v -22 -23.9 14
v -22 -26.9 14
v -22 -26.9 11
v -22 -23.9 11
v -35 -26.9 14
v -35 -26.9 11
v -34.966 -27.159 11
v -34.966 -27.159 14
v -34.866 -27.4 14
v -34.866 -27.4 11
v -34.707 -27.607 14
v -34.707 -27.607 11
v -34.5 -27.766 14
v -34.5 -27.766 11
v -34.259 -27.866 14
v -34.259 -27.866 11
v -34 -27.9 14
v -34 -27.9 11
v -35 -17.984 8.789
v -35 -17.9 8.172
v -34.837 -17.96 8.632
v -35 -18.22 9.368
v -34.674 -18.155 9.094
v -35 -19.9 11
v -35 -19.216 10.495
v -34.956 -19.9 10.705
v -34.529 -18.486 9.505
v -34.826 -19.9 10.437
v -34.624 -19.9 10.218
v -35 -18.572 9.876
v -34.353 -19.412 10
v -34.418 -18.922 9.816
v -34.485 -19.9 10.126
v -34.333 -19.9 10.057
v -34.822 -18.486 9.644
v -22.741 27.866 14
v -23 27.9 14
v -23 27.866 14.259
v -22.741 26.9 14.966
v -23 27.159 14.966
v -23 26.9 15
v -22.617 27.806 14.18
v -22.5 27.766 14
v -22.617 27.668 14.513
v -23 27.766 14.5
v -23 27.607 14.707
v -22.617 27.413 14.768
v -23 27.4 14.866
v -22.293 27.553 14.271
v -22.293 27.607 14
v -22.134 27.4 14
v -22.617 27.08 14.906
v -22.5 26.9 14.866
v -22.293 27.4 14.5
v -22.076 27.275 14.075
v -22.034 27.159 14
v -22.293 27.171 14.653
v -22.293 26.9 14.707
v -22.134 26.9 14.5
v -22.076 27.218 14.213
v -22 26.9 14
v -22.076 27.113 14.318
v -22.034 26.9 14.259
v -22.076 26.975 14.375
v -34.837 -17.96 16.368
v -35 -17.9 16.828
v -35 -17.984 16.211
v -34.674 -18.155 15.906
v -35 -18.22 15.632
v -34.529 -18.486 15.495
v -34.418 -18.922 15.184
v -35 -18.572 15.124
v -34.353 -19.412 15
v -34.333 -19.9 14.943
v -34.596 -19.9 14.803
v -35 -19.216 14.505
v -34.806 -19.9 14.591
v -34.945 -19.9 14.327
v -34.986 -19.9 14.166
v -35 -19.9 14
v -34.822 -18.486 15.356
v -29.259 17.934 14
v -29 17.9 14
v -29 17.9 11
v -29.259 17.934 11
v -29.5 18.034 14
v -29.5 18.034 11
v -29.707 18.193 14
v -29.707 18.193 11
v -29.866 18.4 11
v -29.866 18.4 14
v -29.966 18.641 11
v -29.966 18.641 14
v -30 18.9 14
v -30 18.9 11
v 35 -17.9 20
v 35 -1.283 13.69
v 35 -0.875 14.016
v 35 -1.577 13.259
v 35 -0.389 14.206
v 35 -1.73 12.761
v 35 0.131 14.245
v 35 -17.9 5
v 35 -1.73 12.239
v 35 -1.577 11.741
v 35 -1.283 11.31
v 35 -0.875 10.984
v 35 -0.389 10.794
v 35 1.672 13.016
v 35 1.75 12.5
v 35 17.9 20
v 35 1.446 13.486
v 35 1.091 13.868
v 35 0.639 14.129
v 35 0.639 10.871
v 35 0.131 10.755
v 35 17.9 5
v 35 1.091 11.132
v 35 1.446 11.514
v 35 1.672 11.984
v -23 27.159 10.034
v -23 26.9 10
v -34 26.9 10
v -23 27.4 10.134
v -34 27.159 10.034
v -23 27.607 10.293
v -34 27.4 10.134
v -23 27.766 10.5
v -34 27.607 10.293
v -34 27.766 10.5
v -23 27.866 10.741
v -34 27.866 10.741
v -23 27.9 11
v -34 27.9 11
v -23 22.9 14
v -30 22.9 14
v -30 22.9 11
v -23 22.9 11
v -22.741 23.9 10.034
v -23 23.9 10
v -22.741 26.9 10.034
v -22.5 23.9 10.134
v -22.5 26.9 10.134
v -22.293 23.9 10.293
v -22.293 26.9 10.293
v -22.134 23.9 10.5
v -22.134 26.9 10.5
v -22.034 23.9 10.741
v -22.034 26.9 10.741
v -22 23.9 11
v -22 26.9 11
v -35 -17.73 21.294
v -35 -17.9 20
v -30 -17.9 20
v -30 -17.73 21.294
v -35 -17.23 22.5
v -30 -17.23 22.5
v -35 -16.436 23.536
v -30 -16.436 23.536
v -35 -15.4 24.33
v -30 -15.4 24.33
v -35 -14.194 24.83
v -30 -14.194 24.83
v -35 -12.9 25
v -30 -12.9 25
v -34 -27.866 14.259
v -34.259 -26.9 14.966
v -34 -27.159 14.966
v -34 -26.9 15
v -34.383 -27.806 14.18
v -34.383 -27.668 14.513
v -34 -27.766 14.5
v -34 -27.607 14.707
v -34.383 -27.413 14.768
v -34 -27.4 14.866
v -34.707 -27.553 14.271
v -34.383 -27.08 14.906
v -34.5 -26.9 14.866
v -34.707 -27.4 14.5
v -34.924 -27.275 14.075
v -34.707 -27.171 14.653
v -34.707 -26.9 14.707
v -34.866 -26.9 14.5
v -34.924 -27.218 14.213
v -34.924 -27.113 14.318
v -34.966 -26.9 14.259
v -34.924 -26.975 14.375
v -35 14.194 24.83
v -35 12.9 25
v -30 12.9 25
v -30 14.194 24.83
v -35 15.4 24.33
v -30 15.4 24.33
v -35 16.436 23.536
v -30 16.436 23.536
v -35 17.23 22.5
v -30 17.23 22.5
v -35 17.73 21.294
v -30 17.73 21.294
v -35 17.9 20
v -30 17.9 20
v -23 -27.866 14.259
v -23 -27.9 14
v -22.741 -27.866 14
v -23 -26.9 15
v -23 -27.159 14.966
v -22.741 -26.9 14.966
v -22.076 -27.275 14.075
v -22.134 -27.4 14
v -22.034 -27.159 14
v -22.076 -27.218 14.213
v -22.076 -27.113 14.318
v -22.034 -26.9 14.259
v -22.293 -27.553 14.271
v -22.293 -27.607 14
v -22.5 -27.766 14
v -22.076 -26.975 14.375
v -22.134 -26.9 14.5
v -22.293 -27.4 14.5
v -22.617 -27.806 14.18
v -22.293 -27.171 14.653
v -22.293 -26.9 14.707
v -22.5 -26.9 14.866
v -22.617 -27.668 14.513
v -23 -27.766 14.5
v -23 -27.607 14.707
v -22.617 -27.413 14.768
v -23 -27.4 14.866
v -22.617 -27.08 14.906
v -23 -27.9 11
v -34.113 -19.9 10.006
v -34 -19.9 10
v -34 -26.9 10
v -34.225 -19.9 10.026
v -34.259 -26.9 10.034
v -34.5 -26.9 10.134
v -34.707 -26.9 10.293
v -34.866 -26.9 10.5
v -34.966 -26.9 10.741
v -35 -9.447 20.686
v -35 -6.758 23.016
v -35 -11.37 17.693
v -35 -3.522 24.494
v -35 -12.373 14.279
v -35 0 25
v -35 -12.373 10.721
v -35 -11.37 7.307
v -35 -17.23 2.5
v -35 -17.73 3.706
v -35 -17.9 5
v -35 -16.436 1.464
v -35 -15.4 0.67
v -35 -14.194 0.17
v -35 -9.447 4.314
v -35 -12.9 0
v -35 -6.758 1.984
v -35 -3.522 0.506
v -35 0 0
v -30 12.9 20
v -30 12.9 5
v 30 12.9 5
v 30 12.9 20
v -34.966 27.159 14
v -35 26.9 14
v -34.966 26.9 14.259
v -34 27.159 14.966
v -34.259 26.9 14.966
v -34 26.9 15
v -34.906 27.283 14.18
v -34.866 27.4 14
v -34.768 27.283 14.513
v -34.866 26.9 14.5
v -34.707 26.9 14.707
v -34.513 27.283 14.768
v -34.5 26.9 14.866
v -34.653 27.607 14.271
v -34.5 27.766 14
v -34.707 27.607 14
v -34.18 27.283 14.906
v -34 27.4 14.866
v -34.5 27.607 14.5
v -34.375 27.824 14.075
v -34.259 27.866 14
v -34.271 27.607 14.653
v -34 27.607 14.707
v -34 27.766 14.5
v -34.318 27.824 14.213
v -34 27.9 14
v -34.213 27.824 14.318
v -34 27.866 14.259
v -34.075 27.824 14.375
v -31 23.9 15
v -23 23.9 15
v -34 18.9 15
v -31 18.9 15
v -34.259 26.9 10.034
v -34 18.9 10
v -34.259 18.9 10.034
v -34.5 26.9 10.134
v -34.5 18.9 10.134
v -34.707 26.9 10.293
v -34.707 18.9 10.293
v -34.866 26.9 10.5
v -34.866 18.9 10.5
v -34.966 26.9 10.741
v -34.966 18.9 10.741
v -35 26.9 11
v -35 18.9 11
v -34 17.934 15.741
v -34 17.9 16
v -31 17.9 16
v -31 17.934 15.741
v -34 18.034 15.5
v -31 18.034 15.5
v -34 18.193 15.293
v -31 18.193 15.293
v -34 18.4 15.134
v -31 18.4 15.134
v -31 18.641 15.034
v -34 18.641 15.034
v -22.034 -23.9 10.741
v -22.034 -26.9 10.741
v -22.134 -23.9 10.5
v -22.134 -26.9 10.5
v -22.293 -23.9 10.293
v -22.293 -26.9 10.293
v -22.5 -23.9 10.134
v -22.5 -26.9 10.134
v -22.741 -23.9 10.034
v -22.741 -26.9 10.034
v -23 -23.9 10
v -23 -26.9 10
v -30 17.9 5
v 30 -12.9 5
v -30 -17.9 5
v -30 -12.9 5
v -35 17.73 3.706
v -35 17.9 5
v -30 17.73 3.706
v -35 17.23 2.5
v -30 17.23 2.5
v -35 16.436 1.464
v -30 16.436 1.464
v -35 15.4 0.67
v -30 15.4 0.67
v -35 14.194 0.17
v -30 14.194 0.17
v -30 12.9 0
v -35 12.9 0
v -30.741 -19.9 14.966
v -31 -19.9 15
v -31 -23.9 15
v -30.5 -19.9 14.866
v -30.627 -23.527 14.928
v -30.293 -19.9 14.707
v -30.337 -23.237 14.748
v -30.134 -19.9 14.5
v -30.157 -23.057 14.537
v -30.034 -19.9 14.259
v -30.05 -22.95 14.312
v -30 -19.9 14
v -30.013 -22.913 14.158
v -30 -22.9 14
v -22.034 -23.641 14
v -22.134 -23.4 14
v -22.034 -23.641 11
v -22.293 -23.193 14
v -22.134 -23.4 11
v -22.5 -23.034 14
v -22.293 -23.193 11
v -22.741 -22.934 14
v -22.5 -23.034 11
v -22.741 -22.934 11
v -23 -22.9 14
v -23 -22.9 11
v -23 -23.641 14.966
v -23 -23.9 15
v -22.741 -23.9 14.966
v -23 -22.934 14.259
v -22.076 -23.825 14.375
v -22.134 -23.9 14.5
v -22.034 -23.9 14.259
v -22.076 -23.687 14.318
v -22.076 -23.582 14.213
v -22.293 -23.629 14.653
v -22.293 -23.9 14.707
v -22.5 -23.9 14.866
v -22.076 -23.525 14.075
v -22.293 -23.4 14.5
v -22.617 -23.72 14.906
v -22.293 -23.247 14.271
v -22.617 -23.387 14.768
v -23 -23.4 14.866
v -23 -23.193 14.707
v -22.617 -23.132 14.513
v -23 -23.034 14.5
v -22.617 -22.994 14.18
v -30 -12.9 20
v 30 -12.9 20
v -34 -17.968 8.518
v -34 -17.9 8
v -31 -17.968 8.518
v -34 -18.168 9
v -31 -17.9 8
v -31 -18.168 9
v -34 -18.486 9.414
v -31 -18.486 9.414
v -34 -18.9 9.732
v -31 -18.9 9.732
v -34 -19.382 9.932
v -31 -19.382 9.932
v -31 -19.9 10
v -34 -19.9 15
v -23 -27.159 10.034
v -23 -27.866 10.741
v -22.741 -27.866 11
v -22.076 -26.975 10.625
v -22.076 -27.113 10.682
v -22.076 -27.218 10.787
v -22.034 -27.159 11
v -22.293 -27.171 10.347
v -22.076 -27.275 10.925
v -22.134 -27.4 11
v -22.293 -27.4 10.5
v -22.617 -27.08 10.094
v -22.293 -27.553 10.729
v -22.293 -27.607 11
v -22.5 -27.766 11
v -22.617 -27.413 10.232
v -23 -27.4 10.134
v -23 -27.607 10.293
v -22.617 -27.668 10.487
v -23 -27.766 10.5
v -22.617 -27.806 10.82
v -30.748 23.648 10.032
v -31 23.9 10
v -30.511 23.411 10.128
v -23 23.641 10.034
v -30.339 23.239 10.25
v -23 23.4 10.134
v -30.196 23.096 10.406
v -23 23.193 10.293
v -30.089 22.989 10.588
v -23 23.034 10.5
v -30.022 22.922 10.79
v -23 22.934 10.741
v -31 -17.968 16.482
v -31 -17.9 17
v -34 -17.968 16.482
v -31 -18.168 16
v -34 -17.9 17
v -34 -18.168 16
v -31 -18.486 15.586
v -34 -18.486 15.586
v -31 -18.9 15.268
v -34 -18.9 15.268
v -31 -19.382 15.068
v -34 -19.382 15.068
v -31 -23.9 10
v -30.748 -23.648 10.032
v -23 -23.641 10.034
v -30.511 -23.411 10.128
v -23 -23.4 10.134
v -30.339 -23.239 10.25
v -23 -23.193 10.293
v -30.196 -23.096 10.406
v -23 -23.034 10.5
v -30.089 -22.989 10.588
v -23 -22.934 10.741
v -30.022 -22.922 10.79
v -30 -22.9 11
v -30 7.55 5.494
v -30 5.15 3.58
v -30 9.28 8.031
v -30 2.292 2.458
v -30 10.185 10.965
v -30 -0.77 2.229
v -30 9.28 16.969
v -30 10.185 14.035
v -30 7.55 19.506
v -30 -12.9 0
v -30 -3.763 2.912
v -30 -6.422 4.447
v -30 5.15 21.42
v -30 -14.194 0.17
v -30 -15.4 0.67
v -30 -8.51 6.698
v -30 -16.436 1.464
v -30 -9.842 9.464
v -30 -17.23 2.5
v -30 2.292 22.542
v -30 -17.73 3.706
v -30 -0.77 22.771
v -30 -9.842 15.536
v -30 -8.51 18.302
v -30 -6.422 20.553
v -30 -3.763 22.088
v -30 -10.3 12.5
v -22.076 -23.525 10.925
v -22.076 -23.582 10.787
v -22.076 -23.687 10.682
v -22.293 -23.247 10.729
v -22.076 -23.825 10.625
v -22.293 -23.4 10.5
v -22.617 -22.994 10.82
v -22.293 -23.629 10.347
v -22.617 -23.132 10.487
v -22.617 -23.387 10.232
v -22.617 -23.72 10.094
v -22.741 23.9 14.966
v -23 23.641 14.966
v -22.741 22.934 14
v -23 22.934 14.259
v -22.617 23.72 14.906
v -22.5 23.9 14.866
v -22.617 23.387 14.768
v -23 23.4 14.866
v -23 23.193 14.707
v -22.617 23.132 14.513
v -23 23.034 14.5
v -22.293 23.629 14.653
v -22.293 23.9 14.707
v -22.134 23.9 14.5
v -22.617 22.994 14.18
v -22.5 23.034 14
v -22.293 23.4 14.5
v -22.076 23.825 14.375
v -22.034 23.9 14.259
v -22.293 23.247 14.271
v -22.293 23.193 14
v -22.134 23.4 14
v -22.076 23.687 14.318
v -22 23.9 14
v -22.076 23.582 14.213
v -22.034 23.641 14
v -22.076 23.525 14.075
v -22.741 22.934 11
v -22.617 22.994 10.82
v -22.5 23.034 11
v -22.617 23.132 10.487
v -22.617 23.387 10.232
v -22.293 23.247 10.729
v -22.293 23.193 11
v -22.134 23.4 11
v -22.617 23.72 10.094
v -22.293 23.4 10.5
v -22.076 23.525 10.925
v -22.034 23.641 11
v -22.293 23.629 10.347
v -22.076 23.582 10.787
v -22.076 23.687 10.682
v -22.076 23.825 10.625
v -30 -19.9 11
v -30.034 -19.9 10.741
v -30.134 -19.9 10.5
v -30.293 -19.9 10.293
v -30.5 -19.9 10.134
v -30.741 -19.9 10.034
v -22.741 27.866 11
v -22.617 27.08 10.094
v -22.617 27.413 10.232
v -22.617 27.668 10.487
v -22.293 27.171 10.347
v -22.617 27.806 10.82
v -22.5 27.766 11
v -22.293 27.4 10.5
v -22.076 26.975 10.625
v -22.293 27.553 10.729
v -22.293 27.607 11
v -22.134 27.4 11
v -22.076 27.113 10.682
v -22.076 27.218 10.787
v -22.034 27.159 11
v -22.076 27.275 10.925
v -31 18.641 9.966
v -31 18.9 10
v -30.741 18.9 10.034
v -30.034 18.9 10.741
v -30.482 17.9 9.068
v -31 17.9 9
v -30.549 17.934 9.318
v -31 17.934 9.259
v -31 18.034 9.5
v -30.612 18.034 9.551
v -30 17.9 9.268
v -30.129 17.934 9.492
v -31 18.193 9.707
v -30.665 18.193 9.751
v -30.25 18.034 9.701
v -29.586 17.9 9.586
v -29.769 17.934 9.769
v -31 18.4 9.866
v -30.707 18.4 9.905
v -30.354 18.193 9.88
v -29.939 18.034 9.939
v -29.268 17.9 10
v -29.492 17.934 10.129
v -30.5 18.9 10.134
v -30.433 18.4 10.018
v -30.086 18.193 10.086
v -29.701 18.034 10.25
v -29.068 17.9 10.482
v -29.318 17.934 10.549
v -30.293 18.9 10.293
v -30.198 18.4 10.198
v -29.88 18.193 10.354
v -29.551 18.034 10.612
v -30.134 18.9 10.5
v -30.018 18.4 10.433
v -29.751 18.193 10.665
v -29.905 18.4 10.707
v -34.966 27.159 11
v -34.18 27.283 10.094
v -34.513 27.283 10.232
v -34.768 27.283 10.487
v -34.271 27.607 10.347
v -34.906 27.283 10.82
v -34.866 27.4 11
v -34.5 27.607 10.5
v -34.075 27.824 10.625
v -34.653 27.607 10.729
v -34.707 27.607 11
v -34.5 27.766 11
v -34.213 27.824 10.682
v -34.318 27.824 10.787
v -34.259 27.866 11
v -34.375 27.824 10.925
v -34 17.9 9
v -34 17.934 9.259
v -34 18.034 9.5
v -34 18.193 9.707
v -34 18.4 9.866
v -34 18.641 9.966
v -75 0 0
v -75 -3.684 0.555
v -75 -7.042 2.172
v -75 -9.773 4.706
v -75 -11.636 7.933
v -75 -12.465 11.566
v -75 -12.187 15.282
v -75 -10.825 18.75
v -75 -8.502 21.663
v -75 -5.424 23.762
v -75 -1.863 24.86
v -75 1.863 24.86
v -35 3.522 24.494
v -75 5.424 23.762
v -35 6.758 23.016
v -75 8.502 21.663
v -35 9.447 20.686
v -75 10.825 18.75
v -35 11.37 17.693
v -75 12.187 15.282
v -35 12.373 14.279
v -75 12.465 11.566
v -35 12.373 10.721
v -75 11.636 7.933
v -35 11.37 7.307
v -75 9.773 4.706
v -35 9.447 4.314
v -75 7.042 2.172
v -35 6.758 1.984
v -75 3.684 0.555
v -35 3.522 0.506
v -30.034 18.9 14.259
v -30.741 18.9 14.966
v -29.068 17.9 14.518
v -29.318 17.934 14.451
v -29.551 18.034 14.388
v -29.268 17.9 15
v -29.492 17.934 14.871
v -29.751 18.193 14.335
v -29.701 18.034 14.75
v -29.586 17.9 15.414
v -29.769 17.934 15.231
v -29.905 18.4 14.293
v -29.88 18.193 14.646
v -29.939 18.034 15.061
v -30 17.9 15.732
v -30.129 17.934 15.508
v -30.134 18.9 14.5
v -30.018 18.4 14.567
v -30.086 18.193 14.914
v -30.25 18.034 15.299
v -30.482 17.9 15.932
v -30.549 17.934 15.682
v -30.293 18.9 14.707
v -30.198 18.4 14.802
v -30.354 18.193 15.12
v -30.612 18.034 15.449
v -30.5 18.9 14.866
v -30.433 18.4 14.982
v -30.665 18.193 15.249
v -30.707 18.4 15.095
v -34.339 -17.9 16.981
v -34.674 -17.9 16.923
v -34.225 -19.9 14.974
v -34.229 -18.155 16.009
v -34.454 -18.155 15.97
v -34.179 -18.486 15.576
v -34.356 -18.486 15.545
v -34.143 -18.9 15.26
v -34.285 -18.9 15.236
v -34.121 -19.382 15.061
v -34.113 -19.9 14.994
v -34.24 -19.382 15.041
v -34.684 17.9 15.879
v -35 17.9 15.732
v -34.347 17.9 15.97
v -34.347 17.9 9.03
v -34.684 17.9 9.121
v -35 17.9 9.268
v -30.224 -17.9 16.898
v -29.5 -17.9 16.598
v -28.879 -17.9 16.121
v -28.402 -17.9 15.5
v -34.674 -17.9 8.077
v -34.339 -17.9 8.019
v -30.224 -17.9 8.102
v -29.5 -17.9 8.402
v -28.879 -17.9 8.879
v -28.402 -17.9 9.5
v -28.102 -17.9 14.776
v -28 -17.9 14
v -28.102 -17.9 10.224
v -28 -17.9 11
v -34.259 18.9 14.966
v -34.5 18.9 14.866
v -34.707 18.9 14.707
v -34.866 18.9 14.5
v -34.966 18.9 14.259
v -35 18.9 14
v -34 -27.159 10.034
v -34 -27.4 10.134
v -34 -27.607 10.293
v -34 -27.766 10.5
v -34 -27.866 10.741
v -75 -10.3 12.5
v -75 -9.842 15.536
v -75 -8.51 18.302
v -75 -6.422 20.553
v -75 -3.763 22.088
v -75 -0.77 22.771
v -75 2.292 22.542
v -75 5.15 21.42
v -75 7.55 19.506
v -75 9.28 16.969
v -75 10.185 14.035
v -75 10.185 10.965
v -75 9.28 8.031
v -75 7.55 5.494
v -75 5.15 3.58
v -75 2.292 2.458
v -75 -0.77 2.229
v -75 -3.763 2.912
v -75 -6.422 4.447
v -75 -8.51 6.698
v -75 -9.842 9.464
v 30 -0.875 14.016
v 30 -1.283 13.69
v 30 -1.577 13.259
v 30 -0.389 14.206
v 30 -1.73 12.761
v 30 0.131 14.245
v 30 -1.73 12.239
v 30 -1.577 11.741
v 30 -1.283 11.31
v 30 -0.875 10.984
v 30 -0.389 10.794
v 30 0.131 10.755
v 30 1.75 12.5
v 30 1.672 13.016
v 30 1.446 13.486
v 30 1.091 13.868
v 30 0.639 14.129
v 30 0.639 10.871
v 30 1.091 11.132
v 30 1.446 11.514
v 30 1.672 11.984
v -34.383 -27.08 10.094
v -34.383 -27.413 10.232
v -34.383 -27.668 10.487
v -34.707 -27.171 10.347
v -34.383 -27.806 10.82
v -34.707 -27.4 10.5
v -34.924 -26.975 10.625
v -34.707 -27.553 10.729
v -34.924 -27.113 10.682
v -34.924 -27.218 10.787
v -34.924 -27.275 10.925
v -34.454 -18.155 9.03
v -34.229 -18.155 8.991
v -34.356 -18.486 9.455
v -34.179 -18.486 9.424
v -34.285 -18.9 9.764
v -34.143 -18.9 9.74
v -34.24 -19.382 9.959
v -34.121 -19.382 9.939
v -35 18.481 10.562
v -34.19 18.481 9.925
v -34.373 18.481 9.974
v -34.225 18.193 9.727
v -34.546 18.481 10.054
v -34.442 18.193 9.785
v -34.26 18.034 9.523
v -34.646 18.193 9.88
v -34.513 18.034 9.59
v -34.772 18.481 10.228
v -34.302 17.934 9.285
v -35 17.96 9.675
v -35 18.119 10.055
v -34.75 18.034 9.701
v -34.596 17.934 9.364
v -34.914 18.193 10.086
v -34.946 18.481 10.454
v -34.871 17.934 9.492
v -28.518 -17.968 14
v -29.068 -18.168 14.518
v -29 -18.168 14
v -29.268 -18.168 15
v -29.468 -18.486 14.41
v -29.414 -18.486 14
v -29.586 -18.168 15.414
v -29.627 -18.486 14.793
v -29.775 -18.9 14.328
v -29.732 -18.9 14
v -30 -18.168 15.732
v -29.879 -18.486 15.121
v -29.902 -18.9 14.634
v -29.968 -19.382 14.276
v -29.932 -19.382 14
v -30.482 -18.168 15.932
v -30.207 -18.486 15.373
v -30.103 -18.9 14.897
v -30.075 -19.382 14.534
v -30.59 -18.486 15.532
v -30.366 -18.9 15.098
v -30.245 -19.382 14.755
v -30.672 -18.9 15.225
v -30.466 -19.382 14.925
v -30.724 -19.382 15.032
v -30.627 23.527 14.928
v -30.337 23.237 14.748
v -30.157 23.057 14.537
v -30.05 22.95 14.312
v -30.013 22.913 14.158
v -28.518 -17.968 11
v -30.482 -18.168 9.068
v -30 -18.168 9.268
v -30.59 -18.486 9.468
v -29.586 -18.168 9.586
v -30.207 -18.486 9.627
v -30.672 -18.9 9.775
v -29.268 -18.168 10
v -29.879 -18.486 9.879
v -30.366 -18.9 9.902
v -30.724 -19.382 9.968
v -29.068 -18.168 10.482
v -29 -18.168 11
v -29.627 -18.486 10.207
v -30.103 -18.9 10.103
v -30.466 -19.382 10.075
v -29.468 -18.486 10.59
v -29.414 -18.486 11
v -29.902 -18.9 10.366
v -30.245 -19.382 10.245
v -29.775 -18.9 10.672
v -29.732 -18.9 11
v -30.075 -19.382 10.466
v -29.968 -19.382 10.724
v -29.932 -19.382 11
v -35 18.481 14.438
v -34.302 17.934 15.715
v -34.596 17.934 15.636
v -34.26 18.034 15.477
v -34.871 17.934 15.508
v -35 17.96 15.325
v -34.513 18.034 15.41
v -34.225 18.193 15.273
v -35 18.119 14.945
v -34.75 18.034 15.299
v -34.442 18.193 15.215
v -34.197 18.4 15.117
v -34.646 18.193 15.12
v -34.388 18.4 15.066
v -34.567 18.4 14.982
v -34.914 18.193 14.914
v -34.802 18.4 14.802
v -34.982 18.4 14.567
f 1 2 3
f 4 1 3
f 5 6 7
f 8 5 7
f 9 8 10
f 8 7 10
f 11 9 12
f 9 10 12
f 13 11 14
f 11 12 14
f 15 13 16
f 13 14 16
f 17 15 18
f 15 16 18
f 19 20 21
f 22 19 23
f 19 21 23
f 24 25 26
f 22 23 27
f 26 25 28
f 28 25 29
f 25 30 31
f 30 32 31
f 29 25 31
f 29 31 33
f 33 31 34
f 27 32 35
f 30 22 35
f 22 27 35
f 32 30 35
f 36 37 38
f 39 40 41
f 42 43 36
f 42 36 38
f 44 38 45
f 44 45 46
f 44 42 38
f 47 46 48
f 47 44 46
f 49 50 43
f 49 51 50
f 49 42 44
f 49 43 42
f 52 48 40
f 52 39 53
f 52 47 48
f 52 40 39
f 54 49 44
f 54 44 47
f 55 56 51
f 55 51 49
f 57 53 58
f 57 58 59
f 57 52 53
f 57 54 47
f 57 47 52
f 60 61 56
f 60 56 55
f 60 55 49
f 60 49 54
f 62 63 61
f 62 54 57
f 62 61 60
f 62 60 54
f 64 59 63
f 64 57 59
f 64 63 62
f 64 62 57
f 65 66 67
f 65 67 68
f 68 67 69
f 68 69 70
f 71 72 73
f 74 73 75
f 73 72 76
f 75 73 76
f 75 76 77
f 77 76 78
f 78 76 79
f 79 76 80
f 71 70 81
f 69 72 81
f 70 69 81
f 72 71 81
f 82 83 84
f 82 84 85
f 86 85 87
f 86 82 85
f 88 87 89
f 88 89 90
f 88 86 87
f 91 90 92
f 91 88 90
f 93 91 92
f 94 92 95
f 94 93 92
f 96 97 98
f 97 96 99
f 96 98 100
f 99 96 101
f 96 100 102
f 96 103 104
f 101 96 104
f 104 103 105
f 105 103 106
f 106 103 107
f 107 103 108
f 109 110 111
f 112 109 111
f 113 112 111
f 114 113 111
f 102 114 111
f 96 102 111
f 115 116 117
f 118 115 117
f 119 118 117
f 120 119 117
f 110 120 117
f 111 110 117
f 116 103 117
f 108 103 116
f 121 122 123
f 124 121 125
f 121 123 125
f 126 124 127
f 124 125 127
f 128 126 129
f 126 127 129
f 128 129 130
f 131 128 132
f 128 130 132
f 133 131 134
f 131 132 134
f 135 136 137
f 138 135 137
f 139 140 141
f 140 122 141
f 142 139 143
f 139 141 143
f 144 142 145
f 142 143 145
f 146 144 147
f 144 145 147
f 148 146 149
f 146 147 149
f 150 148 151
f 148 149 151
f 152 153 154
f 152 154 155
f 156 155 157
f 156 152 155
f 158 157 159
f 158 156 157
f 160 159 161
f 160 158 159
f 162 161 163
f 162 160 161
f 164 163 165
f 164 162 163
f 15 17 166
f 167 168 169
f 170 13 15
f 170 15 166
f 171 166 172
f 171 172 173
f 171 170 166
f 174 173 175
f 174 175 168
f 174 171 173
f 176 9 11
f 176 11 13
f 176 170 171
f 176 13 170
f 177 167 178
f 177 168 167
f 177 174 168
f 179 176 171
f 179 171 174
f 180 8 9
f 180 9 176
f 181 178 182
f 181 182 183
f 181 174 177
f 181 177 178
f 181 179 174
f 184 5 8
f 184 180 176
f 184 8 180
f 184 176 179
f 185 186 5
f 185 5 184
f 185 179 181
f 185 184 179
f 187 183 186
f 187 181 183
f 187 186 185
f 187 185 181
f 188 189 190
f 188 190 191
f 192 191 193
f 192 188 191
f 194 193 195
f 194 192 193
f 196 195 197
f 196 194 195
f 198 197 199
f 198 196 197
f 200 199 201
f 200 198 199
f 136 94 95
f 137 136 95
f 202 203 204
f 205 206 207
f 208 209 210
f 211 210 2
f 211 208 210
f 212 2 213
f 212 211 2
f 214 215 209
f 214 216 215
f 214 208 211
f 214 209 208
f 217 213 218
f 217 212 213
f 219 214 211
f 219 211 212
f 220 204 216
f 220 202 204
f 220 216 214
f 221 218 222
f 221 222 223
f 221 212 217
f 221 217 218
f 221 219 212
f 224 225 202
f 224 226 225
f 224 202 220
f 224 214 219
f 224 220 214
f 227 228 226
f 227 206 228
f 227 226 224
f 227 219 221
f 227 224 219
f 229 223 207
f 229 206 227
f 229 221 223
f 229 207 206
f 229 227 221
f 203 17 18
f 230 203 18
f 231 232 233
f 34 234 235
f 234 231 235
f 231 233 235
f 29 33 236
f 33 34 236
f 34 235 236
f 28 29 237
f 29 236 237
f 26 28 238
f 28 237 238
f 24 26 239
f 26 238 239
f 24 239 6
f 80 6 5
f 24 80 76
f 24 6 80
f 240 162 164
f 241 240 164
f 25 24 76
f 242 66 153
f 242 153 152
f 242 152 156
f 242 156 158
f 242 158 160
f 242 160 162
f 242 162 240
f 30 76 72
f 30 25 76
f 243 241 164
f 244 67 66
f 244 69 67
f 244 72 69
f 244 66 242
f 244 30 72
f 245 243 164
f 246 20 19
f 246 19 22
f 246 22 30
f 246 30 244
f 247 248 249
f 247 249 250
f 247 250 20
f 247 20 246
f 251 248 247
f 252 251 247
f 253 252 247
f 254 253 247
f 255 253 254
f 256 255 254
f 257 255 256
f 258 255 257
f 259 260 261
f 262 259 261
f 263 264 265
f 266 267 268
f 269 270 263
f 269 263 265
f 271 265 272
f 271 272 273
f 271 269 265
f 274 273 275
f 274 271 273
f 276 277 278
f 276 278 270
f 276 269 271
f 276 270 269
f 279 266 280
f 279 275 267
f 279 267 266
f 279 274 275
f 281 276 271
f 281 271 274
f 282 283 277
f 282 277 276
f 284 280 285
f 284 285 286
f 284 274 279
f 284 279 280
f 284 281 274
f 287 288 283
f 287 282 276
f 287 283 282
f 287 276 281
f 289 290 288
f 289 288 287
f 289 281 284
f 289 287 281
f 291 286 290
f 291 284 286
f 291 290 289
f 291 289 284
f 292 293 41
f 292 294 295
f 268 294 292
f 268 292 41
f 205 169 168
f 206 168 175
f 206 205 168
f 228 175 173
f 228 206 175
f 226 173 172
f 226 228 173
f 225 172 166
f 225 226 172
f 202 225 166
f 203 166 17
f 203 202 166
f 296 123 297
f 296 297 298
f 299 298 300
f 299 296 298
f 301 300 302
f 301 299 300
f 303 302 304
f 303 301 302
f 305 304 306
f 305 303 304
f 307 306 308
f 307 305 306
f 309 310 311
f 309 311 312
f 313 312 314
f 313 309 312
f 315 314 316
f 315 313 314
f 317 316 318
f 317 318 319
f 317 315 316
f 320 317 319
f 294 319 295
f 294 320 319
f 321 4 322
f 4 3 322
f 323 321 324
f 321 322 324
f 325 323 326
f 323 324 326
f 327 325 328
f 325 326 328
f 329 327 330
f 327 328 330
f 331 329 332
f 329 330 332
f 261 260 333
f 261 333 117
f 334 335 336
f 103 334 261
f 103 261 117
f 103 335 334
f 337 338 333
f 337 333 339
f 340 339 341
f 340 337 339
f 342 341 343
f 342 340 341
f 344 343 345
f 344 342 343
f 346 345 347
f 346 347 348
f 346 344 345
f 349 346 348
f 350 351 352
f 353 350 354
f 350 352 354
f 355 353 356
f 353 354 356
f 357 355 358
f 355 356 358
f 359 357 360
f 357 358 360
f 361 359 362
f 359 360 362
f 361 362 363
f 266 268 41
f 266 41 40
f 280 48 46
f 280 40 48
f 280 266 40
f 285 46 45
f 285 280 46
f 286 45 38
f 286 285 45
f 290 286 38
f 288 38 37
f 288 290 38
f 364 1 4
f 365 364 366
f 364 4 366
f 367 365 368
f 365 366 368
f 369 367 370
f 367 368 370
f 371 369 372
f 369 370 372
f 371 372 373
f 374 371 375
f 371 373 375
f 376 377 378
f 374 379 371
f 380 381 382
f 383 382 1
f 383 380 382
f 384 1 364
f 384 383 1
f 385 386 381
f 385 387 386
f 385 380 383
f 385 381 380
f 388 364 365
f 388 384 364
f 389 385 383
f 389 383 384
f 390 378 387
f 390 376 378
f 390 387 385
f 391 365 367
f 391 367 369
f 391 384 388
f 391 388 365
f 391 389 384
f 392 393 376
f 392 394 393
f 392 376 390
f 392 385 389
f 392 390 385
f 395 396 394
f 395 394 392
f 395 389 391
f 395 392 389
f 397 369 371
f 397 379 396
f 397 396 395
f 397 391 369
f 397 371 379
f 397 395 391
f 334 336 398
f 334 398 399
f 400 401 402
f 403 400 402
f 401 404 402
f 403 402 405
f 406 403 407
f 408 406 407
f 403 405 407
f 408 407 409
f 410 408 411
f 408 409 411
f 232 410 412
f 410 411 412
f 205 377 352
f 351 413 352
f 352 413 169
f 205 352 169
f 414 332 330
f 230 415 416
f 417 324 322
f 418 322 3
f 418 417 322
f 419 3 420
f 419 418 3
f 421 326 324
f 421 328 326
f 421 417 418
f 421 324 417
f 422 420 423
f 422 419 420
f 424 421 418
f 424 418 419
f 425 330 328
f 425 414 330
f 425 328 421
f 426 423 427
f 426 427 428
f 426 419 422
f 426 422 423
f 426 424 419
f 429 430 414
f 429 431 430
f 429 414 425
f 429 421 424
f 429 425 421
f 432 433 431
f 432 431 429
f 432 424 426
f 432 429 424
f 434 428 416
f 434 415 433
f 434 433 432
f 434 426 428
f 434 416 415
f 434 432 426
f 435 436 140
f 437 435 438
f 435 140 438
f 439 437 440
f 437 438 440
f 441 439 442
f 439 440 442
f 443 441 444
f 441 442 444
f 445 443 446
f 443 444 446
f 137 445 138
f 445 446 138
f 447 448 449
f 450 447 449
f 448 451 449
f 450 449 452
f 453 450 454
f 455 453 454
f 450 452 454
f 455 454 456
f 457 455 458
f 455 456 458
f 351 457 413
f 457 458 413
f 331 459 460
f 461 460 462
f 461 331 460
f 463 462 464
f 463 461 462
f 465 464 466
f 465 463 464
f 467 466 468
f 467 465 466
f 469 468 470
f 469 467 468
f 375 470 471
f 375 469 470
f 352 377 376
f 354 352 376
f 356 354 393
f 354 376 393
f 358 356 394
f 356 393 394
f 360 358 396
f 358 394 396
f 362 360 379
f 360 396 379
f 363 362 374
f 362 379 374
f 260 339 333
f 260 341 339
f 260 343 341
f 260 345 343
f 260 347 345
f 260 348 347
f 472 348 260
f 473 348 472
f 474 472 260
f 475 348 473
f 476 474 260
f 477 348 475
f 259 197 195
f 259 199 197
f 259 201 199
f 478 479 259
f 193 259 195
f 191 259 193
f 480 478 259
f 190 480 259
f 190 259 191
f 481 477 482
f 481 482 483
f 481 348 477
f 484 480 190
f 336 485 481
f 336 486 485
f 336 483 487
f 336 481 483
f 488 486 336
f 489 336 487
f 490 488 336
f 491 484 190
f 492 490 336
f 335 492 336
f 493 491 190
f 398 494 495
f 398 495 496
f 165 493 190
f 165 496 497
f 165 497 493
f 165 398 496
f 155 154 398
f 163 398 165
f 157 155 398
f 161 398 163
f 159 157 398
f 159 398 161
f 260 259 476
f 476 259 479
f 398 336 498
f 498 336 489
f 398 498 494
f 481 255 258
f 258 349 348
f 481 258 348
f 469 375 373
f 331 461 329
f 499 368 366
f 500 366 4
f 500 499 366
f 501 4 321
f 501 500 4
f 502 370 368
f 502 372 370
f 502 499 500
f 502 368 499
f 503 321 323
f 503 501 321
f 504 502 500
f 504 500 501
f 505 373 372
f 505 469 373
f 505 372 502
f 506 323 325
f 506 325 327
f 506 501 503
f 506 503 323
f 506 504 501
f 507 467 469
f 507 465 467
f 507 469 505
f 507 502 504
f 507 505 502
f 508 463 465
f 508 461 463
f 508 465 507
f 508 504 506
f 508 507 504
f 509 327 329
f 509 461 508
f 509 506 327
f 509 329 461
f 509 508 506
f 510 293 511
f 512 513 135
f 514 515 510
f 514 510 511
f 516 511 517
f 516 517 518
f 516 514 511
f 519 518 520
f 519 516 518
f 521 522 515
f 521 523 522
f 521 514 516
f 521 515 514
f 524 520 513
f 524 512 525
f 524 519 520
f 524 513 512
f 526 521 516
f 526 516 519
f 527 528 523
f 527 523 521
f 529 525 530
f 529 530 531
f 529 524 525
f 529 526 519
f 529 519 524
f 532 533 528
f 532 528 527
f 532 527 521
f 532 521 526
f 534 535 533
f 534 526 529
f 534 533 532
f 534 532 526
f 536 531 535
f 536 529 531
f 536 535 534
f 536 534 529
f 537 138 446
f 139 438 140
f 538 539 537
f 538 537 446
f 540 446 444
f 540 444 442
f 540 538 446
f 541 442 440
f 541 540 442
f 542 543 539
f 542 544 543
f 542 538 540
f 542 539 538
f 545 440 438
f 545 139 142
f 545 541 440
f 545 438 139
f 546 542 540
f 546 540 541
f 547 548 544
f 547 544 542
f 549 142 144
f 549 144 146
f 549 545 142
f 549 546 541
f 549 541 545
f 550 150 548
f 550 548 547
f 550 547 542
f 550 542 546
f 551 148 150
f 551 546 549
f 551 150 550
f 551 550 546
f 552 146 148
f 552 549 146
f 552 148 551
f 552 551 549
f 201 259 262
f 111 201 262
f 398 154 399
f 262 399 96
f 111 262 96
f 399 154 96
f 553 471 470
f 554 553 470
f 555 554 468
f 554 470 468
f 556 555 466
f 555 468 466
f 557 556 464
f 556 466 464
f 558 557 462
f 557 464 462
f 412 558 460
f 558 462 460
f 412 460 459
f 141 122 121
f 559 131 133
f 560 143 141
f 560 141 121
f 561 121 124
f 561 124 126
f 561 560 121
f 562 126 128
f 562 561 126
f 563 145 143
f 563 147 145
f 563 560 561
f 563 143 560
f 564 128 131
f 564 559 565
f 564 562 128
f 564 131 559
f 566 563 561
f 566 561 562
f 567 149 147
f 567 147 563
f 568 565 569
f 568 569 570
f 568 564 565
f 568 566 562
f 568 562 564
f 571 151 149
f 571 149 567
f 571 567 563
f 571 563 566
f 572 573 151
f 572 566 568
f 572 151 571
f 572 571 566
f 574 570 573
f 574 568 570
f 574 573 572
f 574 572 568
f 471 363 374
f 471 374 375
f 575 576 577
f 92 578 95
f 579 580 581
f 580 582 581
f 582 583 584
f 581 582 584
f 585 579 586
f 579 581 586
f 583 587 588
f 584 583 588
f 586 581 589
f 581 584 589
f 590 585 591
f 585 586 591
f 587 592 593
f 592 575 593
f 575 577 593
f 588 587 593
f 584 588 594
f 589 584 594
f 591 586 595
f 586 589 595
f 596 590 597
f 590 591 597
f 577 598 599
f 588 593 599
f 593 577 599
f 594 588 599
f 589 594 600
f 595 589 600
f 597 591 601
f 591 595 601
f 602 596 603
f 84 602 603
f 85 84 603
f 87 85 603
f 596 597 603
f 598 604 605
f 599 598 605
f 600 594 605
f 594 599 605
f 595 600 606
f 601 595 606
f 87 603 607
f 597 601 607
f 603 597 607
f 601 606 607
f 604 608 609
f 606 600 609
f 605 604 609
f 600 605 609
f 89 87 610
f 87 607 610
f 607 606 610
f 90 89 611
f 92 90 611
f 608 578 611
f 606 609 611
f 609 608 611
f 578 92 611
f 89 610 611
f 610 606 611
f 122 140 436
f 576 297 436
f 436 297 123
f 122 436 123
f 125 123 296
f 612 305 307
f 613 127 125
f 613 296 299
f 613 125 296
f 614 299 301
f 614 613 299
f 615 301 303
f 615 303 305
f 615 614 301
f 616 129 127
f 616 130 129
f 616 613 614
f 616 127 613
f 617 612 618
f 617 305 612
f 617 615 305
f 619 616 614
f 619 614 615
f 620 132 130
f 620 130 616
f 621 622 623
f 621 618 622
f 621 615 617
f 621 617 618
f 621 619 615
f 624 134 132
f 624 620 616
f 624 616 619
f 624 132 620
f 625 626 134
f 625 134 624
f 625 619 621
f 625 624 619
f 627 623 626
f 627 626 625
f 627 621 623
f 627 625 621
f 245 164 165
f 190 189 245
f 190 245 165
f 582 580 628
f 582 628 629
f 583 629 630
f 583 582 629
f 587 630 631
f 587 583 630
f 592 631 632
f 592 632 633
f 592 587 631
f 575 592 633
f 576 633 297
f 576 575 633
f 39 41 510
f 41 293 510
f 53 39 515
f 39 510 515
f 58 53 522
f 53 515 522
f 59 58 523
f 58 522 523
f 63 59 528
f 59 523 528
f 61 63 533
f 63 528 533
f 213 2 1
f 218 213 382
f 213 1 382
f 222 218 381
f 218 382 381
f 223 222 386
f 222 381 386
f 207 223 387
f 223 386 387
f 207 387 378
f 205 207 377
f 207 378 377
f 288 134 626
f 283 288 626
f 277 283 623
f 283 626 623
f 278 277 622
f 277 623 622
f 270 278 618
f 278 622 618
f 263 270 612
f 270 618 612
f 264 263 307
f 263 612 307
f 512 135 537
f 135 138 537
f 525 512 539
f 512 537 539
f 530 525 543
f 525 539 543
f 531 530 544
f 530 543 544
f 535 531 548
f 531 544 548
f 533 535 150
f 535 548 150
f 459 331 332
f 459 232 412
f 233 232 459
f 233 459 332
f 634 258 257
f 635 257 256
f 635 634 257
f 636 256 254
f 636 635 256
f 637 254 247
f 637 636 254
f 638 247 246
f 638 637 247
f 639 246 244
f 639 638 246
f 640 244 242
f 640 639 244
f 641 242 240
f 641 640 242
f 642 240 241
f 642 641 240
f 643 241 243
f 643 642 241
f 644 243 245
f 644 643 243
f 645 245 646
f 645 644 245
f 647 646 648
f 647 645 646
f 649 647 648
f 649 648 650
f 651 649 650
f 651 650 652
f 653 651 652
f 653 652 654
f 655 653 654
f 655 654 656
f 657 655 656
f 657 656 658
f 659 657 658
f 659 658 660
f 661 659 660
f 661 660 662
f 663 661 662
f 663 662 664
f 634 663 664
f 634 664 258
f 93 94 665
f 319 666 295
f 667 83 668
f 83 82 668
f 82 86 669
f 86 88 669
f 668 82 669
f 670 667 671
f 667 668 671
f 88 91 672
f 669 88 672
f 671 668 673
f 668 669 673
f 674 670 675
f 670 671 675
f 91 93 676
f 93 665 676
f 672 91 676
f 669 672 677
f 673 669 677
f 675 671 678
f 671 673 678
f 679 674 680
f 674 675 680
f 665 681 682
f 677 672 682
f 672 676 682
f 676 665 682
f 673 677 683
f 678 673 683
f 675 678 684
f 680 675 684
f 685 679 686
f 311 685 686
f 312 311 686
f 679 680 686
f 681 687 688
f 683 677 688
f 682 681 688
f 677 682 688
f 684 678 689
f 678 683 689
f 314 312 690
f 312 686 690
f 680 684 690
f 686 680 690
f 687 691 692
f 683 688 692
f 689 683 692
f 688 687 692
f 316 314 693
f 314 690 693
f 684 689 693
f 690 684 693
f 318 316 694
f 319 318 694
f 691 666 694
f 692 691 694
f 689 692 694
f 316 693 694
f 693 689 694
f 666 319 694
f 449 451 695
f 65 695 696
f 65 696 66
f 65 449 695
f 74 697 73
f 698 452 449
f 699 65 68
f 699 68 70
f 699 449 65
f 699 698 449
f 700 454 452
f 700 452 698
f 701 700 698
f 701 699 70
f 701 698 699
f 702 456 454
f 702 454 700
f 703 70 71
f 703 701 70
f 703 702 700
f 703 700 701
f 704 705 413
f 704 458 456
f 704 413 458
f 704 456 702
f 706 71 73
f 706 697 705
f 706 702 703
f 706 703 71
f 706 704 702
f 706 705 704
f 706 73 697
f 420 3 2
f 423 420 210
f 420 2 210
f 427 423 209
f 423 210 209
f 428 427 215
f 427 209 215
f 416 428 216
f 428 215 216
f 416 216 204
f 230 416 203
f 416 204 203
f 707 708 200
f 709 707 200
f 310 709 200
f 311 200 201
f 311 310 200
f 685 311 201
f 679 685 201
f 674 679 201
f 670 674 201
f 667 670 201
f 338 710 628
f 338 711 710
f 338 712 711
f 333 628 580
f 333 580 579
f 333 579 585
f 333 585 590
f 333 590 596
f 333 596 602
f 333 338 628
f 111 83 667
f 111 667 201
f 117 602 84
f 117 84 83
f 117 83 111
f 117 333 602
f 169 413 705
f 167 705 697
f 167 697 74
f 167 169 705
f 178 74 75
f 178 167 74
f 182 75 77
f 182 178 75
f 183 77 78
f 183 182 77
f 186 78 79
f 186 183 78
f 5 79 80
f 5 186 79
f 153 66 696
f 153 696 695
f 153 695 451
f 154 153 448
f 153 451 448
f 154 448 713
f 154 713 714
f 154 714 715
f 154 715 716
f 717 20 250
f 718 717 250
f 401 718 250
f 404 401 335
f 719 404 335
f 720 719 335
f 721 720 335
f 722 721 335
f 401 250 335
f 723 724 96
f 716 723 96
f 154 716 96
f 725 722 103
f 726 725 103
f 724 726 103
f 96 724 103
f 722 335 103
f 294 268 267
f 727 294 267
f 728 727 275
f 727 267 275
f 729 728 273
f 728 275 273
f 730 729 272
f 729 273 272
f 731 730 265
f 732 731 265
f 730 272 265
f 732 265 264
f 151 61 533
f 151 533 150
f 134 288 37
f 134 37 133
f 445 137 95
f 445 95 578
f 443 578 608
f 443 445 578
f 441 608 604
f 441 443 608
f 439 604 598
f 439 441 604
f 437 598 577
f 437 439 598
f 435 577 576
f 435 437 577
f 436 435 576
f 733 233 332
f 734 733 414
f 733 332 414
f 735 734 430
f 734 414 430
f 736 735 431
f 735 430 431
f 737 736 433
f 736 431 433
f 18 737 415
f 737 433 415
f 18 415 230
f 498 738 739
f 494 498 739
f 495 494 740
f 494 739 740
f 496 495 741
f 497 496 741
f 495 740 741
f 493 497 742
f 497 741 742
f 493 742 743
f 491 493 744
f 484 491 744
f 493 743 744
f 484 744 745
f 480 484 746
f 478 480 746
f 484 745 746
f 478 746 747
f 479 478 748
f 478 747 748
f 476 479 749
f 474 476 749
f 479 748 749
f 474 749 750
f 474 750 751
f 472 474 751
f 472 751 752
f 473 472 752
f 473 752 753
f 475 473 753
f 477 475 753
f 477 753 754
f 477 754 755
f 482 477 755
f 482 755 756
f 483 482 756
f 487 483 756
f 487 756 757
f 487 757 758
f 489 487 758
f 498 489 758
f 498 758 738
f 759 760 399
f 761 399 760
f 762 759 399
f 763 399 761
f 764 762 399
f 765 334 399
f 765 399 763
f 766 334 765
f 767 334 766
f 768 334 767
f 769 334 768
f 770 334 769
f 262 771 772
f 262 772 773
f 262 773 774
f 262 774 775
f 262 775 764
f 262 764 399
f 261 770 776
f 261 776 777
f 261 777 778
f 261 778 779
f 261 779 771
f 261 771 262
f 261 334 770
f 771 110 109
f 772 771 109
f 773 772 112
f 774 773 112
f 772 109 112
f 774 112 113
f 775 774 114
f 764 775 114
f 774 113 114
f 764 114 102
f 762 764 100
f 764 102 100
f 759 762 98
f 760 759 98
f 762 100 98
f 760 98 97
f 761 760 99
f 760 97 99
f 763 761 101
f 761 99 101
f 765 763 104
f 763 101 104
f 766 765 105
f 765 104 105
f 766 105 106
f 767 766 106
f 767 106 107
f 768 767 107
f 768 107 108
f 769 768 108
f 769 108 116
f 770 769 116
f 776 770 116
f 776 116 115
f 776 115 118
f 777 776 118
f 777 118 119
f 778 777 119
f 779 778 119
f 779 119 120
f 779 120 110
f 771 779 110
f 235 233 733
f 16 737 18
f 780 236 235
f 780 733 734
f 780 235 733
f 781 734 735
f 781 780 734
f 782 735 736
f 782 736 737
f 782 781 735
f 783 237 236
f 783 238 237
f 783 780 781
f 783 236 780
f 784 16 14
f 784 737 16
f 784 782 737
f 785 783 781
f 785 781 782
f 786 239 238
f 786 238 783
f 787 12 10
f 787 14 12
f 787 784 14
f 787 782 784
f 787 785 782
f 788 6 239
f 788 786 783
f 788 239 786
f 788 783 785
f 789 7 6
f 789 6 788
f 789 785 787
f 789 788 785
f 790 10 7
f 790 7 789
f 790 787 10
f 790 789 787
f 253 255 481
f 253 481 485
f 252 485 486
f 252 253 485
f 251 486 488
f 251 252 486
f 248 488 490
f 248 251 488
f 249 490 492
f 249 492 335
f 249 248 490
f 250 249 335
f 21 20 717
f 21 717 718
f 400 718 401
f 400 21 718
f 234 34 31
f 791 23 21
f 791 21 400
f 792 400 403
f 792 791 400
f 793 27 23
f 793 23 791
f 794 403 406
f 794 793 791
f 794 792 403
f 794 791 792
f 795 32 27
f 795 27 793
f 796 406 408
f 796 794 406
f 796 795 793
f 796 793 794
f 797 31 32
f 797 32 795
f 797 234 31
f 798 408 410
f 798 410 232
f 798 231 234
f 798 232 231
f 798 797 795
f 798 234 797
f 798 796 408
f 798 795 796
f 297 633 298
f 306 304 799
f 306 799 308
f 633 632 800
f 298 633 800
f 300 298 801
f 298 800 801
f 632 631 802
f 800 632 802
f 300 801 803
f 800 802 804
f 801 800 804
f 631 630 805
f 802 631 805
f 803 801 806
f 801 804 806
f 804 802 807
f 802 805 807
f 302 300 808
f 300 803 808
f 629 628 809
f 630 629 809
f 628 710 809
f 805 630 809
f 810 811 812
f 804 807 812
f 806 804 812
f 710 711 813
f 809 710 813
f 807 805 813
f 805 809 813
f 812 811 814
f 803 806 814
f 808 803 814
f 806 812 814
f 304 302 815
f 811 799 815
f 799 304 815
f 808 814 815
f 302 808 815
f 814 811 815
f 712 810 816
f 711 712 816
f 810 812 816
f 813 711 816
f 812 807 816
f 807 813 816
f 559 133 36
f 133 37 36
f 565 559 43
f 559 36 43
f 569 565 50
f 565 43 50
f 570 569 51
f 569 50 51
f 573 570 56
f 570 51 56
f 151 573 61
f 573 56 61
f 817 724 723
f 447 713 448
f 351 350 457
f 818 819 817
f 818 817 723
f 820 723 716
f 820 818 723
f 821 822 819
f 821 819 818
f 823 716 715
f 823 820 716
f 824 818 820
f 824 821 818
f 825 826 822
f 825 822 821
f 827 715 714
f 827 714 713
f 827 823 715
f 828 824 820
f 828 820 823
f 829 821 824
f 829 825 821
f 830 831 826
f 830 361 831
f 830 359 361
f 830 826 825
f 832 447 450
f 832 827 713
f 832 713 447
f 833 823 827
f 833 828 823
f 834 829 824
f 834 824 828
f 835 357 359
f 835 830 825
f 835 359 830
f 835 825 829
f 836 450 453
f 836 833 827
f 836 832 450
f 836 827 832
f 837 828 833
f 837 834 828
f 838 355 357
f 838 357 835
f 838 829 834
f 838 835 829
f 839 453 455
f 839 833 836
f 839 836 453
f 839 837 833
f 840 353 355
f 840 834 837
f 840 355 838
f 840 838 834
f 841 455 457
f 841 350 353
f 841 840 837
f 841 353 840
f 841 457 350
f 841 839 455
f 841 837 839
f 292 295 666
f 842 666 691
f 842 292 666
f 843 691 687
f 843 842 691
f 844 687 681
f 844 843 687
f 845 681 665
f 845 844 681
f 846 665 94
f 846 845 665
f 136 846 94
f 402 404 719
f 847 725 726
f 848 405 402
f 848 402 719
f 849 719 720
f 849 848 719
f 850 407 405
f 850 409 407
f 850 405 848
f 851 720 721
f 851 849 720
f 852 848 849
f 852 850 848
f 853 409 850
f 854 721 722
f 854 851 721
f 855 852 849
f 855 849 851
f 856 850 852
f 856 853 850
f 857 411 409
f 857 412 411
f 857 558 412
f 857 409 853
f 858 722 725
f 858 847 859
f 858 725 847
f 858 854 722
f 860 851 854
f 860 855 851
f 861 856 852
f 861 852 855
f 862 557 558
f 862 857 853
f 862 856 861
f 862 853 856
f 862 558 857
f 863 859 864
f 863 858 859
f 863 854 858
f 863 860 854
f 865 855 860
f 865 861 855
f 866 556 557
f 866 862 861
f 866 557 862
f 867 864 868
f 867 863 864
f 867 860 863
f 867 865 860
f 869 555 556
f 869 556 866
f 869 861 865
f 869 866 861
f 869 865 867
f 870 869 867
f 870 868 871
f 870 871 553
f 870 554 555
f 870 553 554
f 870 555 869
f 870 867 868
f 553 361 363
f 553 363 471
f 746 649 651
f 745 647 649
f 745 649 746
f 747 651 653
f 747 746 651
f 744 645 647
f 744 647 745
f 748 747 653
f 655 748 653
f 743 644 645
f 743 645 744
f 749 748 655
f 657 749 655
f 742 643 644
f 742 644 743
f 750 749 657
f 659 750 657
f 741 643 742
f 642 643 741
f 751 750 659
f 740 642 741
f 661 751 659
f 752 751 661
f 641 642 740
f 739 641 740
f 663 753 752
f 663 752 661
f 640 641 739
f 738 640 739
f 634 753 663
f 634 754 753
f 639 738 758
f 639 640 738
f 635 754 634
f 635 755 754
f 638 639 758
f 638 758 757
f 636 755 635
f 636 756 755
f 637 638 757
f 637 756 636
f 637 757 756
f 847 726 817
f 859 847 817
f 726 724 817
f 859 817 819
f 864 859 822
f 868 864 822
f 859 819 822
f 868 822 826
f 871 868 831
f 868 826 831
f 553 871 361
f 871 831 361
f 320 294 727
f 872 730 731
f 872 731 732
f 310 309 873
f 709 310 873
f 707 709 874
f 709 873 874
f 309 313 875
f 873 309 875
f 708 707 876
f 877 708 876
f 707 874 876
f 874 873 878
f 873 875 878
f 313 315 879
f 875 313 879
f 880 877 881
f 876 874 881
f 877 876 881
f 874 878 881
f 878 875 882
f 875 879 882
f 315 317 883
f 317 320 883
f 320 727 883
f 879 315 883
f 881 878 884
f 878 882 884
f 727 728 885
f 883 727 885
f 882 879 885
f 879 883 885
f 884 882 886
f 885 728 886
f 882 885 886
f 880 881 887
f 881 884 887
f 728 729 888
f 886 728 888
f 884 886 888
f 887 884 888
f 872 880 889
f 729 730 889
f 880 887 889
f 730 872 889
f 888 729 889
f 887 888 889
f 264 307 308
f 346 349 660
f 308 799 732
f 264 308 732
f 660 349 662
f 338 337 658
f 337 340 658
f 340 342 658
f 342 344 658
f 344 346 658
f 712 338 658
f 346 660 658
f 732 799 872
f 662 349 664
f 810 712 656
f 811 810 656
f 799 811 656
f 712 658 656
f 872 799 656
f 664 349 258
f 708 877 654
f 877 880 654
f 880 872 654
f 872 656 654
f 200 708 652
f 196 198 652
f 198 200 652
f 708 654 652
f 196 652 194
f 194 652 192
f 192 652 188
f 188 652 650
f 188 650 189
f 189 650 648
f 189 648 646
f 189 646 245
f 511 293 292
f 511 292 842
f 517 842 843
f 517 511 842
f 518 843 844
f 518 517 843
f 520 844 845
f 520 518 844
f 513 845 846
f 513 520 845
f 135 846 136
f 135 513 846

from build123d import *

# Parameters (mm, degrees)
SKETCH1_W            = 70
SKETCH1_H            = 35.8
SKETCH1_W_2          = 60
SKETCH1_H_2          = 25.8
BOSS_EXTRUDE1_DEPTH  = 25
CUT_EXTRUDE4_REACH   = 78.455
SKETCH2_R            = 10.3
CUT_EXTRUDE5_REACH   = 78.455
SKETCH3_R            = 1.75
BOSS_EXTRUDE2_START  = 40
SKETCH4_R            = 12.5
SKETCH4_R_2          = 10.3
BOSS_EXTRUDE2_DEPTH  = 40
SKETCH8_W            = 5
SKETCH8_H            = 5
BOSS_EXTRUDE4_DEPTH  = 10
SKETCH11_W           = 5
SKETCH11_H           = 5
BOSS_EXTRUDE5_DEPTH  = 8
FILLET3_R            = 1
FILLET3_OF_MIRROR2_R = 1
FILLET5_START        = -35
FILLET5_DEPTH        = 71
FILLET6_R            = 1
FILLET7_R            = 1
FILLET8_R            = 1
FILLET9_R            = 1
FILLET10_R           = 2
SKETCH16_W           = 65
SKETCH16_H           = 5
CUT_EXTRUDE8_DEPTH   = 92.365420182


with BuildPart() as part:
    # Sketch1 → Boss-Extrude1 (new body)
    with BuildSketch(Plane.XY):
        Rectangle(SKETCH1_W, SKETCH1_H)
        Rectangle(SKETCH1_W_2, SKETCH1_H_2, mode=Mode.SUBTRACT)
    extrude(amount=BOSS_EXTRUDE1_DEPTH)

    # Sketch2 → Cut-Extrude4 (cut, up to next)
    with BuildSketch(Plane.ZY.offset(35), mode=Mode.PRIVATE) as cut_extrude4_sk1:
        with Locations(Location((12.5, 0, 0), (0, 0, 270))):
            Circle(SKETCH2_R)
    cut_extrude4_tool1 = extrude(cut_extrude4_sk1.sketch, amount=-CUT_EXTRUDE4_REACH, mode=Mode.PRIVATE) & part.part
    add(cut_extrude4_tool1.solids().sort_by_distance((-35, 0, 12.5))[0], mode=Mode.SUBTRACT)

    # Sketch3 → Cut-Extrude5 (cut, up to next)
    with BuildSketch(Plane(origin=(35, 0, 0), x_dir=(0, 0, -1), z_dir=(1, 0, 0)), mode=Mode.PRIVATE) as cut_extrude5_sk1:
        with Locations(Location((-12.5, 0, 0), (0, 0, 90))):
            Circle(SKETCH3_R)
    cut_extrude5_tool1 = extrude(cut_extrude5_sk1.sketch, amount=-CUT_EXTRUDE5_REACH, mode=Mode.PRIVATE) & part.part
    add(cut_extrude5_tool1.solids().sort_by_distance((35, 0, 12.5))[0], mode=Mode.SUBTRACT)

    # Sketch4 → Boss-Extrude2 (add)
    with BuildSketch(Plane.ZY.offset(35).offset(BOSS_EXTRUDE2_START)):
        with Locations(Location((12.5, 0, 0), (0, 0, 180))):
            Circle(SKETCH4_R)
        with Locations(Location((12.5, 0, 0), (0, 0, 270))):
            Circle(SKETCH4_R_2, mode=Mode.SUBTRACT)
    extrude(amount=-BOSS_EXTRUDE2_DEPTH)

    # Sketch8 → Boss-Extrude4 (add)
    with BuildSketch(Plane(origin=(0, 17.9, 0), x_dir=(1, 0, 0), z_dir=(0, 1, 0))):
        with Locations((-32.5, -12.5)):
            Rectangle(SKETCH8_W, SKETCH8_H)
    boss_extrude4 = extrude(amount=BOSS_EXTRUDE4_DEPTH)

    # Sketch11 → Boss-Extrude5 (add)
    with BuildSketch(Plane(origin=(-30, 0, 0), x_dir=(0, 0, -1), z_dir=(1, 0, 0))):
        with Locations((-12.5, 25.4)):
            Rectangle(SKETCH11_W, SKETCH11_H)
    boss_extrude5 = extrude(amount=BOSS_EXTRUDE5_DEPTH)

    # Fillet3
    fillet3_edges = [part.edges().sort_by_distance(p)[0] for p in [
        (-35, 22.9, 10),
        (-35, 22.9, 15),
        (-28.5, 27.9, 15),
        (-28.5, 27.9, 10),
        (-30, 20.4, 10),
        (-30, 20.4, 15),
        (-26, 22.9, 15),
        (-26, 22.9, 10),
    ]]
    fillet(fillet3_edges, radius=FILLET3_R)

    # Mirror2: Boss-Extrude4, Boss-Extrude5 across plane
    add(boss_extrude4.mirror(Plane.ZX))
    add(boss_extrude5.mirror(Plane.ZX))

    # Fillet3 of Mirror2
    fillet3_of_mirror2_edges = [part.edges().sort_by_distance(p)[0] for p in [
        (-35, -22.9, 10),
        (-35, -22.9, 15),
        (-28.5, -27.9, 15),
        (-28.5, -27.9, 10),
        (-30, -20.4, 10),
        (-30, -20.4, 15),
        (-26, -22.9, 15),
        (-26, -22.9, 10),
    ]]
    fillet(fillet3_of_mirror2_edges, radius=FILLET3_OF_MIRROR2_R)

    # Fillet5: read off the stored shape, not the designer's step
    # Fillet5 outline → Fillet5 (cut)
    with BuildSketch(Plane.YZ.offset(FILLET5_START)):
        with BuildLine():
            ThreePointArc((12.9, 25), (16.435533906, 23.535533906), (17.9, 20))
            Line((17.9, 20), (17.9, 25))
            Line((17.9, 25), (12.9, 25))
        make_face()
        with BuildLine():
            Line((17.9, 0), (17.9, 5))
            ThreePointArc((17.9, 5), (16.435533906, 1.464466094), (12.9, 0))
            Line((12.9, 0), (17.9, 0))
        make_face()
        with BuildLine():
            ThreePointArc((-17.9, 20), (-16.435533906, 23.535533906), (-12.9, 25))
            Line((-12.9, 25), (-17.9, 25))
            Line((-17.9, 25), (-17.9, 20))
        make_face()
        with BuildLine():
            Line((-17.9, 0), (-12.9, 0))
            ThreePointArc((-12.9, 0), (-16.435533906, 1.464466094), (-17.9, 5))
            Line((-17.9, 5), (-17.9, 0))
        make_face()
    extrude(amount=FILLET5_DEPTH, mode=Mode.SUBTRACT)

    # Fillet6
    fillet6_edges = [part.edges().sort_by_distance(p)[0] for p in [
        (-22, -25.4, 10),
        (-22, -22.9, 12.5),
        (-22, -25.4, 15),
        (-22, -27.9, 12.5),
        (-22, -23.192893219, 14.707106781),
        (-22, -27.607106781, 14.707106781),
        (-22, -27.607106781, 10.292893219),
        (-22, -23.192893219, 10.292893219),
    ]]
    fillet(fillet6_edges, radius=FILLET6_R)

    # Fillet7
    fillet7_edges = [part.edges().sort_by_distance(p)[0] for p in [
        (-22, 25.4, 10),
        (-22, 22.9, 12.5),
        (-22, 25.4, 15),
        (-22, 27.9, 12.5),
        (-22, 23.192893219, 14.707106781),
        (-22, 27.607106781, 14.707106781),
        (-22, 27.607106781, 10.292893219),
        (-22, 23.192893219, 10.292893219),
    ]]
    fillet(fillet7_edges, radius=FILLET7_R)

    # Fillet8
    # the kernel refuses this fillet: 1 mm, written as the material it takes off along each edge
    with BuildSketch(Plane(origin=(-34, 26.9, 11), x_dir=(-1, 0, 0), z_dir=(0, 1, 0))) as fillet8_piece_1_section:
        Polygon((0, 0), (FILLET8_R, 0), (FILLET8_R, -FILLET8_R), (0, -FILLET8_R), align=None)
    fillet8_piece_1 = extrude(amount=FILLET8_R, mode=Mode.PRIVATE)
    fillet8_piece_1 = fillet8_piece_1 - Plane(origin=(-34, 26.9, 11), x_dir=(0.7071067811865475, 0, 0.7071067811865475), z_dir=(0, 1, 0)) * Sphere(FILLET8_R, mode=Mode.PRIVATE)
    add(fillet8_piece_1, mode=Mode.SUBTRACT)
    with BuildSketch(Plane(origin=(-34, 26.9, 14), x_dir=(-1, 0, 0), z_dir=(0, 1, 0))) as fillet8_piece_2_section:
        Polygon((0, 0), (FILLET8_R, 0), (FILLET8_R, FILLET8_R), (0, FILLET8_R), align=None)
    fillet8_piece_2 = extrude(amount=FILLET8_R, mode=Mode.PRIVATE)
    fillet8_piece_2 = fillet8_piece_2 - Plane(origin=(-34, 26.9, 14), x_dir=(0.7071067811865475, 0, -0.7071067811865475), z_dir=(0, 1, 0)) * Sphere(FILLET8_R, mode=Mode.PRIVATE)
    add(fillet8_piece_2, mode=Mode.SUBTRACT)
    with BuildSketch(Plane(origin=(-34, -26.9, 11), x_dir=(0, -1, 0), z_dir=(-1, 0, 0))) as fillet8_piece_3_section:
        Polygon((0, 0), (FILLET8_R, 0), (FILLET8_R, -FILLET8_R), (0, -FILLET8_R), align=None)
    fillet8_piece_3 = extrude(amount=FILLET8_R, mode=Mode.PRIVATE)
    fillet8_piece_3 = fillet8_piece_3 - Plane(origin=(-34, -26.9, 11), x_dir=(0, 0.7071067811865475, 0.7071067811865475), z_dir=(-1, 0, 0)) * Sphere(FILLET8_R, mode=Mode.PRIVATE)
    add(fillet8_piece_3, mode=Mode.SUBTRACT)
    with BuildSketch(Plane(origin=(-34, -26.9, 14), x_dir=(0, -1, 0), z_dir=(-1, 0, 0))) as fillet8_piece_4_section:
        Polygon((0, 0), (FILLET8_R, 0), (FILLET8_R, FILLET8_R), (0, FILLET8_R), align=None)
    fillet8_piece_4 = extrude(amount=FILLET8_R, mode=Mode.PRIVATE)
    fillet8_piece_4 = fillet8_piece_4 - Plane(origin=(-34, -26.9, 14), x_dir=(0, 0.7071067811865475, -0.7071067811865475), z_dir=(-1, 0, 0)) * Sphere(FILLET8_R, mode=Mode.PRIVATE)
    add(fillet8_piece_4, mode=Mode.SUBTRACT)
    with BuildSketch(Plane(origin=(-35, -27.9, 11), x_dir=(0, 1, 0), z_dir=(0, 0, 1)), Plane(origin=(-35, 27.9, 11), x_dir=(1, 0, 0), z_dir=(0, 0, 1))) as fillet8_piece_5:
        with BuildLine():
            CenterArc((FILLET8_R, -FILLET8_R), FILLET8_R, 90, 90)
            Line((0, -FILLET8_R), (0, 0))
            Line((0, 0), (FILLET8_R, 0))
        make_face()
    extrude(amount=3, mode=Mode.SUBTRACT)

    # Fillet9
    # the kernel refuses this fillet: 1 mm, written as the material it adds along each edge
    with BuildSketch(Plane(origin=(-31, 17.9, 10), x_dir=(0, 1, 0), z_dir=(-1, 0, 0)), Plane(origin=(-34, 17.9, 15), x_dir=(0, 1, 0), z_dir=(1, 0, 0))) as fillet9_piece_1:
        with BuildLine():
            CenterArc((FILLET9_R, FILLET9_R), FILLET9_R, 180, 90)
            Line((0, FILLET9_R), (0, 0))
            Line((0, 0), (FILLET9_R, 0))
        make_face()
    extrude(amount=3)
    with BuildSketch(Plane(origin=(-30, 17.9, 14), x_dir=(1, 0, 0), z_dir=(0, 0, -1))) as fillet9_piece_2:
        with BuildLine():
            CenterArc((FILLET9_R, -FILLET9_R), FILLET9_R, 90, 90)
            Line((0, -FILLET9_R), (0, 0))
            Line((0, 0), (FILLET9_R, 0))
        make_face()
    extrude(amount=3)
    with BuildSketch(Plane(origin=(-34, 17.9, 11), x_dir=(0, 0, -1), z_dir=(1, 0, 0))) as fillet9_piece_3_section:
        with BuildLine():
            CenterArc((1 + FILLET9_R, FILLET9_R), FILLET9_R, 180, 90)
            Line((1, FILLET9_R), (1, 0))
            Line((1, 0), (1 + FILLET9_R, 0))
        make_face()
    fillet9_piece_3 = revolve(axis=Axis((-34, 17.9, 11), (0, 1, 0)), revolution_arc=233.296989237, mode=Mode.PRIVATE)
    fillet9_piece_3 = split(fillet9_piece_3, bisect_by=Plane(origin=(-35, 17.9, 11), z_dir=(1, 0, 0)), keep=Keep.TOP, mode=Mode.PRIVATE)
    add(fillet9_piece_3)
    with BuildSketch(Plane(origin=(-31, 17.9, 11), x_dir=(0, 0, -1), z_dir=(-1, 0, 0))) as fillet9_piece_4:
        with BuildLine():
            CenterArc((1 + FILLET9_R, -FILLET9_R), FILLET9_R, 90, 90)
            Line((1, -FILLET9_R), (1, 0))
            Line((1, 0), (1 + FILLET9_R, 0))
        make_face()
    revolve(axis=Axis((-31, 17.9, 11), (0, -1, 0)), revolution_arc=90)
    with BuildSketch(Plane(origin=(-34, 17.9, 14), x_dir=(0, 0, 1), z_dir=(1, 0, 0))) as fillet9_piece_5_section:
        with BuildLine():
            CenterArc((1 + FILLET9_R, -FILLET9_R), FILLET9_R, 90, 90)
            Line((1 + FILLET9_R, 0), (1, 0))
            Line((1, 0), (1, -FILLET9_R))
        make_face()
    fillet9_piece_5 = revolve(axis=Axis((-34, 17.9, 14), (0, -1, 0)), revolution_arc=233.296989237, mode=Mode.PRIVATE)
    fillet9_piece_5 = split(fillet9_piece_5, bisect_by=Plane(origin=(-35, 17.9, 14), z_dir=(1, 0, 0)), keep=Keep.TOP, mode=Mode.PRIVATE)
    add(fillet9_piece_5)
    with BuildSketch(Plane(origin=(-31, 17.9, 14), x_dir=(1, 0, 0), z_dir=(0, 0, -1))) as fillet9_piece_6:
        with BuildLine():
            CenterArc((1 + FILLET9_R, -FILLET9_R), FILLET9_R, 90, 90)
            Line((1 + FILLET9_R, 0), (1, 0))
            Line((1, 0), (1, -FILLET9_R))
        make_face()
    revolve(axis=Axis((-31, 17.9, 14), (0, -1, 0)), revolution_arc=90)

    # Fillet10
    fillet10_edges = [part.edges().sort_by_distance(p)[0] for p in [
        (-32.5, -17.9, 10),
        (-30, -17.9, 12.5),
        (-32.5, -17.9, 15),
        (-34.707106781, -17.9, 10.292893219),
        (-30.292893219, -17.9, 10.292893219),
        (-34.707106781, -17.9, 14.707106781),
        (-30.292893219, -17.9, 14.707106781),
    ]]
    fillet(fillet10_edges, radius=FILLET10_R)

    # Sketch16 → Cut-Extrude8 (cut, through all)
    with BuildSketch(Plane.XZ.offset(17.9)):
        with Locations((2.5, 22.5)):
            Rectangle(SKETCH16_W, SKETCH16_H)
        with Locations((2.5, 2.5)):
            Rectangle(SKETCH16_W, SKETCH16_H)
    extrude(amount=-CUT_EXTRUDE8_DEPTH, mode=Mode.SUBTRACT)


solid = part.part
